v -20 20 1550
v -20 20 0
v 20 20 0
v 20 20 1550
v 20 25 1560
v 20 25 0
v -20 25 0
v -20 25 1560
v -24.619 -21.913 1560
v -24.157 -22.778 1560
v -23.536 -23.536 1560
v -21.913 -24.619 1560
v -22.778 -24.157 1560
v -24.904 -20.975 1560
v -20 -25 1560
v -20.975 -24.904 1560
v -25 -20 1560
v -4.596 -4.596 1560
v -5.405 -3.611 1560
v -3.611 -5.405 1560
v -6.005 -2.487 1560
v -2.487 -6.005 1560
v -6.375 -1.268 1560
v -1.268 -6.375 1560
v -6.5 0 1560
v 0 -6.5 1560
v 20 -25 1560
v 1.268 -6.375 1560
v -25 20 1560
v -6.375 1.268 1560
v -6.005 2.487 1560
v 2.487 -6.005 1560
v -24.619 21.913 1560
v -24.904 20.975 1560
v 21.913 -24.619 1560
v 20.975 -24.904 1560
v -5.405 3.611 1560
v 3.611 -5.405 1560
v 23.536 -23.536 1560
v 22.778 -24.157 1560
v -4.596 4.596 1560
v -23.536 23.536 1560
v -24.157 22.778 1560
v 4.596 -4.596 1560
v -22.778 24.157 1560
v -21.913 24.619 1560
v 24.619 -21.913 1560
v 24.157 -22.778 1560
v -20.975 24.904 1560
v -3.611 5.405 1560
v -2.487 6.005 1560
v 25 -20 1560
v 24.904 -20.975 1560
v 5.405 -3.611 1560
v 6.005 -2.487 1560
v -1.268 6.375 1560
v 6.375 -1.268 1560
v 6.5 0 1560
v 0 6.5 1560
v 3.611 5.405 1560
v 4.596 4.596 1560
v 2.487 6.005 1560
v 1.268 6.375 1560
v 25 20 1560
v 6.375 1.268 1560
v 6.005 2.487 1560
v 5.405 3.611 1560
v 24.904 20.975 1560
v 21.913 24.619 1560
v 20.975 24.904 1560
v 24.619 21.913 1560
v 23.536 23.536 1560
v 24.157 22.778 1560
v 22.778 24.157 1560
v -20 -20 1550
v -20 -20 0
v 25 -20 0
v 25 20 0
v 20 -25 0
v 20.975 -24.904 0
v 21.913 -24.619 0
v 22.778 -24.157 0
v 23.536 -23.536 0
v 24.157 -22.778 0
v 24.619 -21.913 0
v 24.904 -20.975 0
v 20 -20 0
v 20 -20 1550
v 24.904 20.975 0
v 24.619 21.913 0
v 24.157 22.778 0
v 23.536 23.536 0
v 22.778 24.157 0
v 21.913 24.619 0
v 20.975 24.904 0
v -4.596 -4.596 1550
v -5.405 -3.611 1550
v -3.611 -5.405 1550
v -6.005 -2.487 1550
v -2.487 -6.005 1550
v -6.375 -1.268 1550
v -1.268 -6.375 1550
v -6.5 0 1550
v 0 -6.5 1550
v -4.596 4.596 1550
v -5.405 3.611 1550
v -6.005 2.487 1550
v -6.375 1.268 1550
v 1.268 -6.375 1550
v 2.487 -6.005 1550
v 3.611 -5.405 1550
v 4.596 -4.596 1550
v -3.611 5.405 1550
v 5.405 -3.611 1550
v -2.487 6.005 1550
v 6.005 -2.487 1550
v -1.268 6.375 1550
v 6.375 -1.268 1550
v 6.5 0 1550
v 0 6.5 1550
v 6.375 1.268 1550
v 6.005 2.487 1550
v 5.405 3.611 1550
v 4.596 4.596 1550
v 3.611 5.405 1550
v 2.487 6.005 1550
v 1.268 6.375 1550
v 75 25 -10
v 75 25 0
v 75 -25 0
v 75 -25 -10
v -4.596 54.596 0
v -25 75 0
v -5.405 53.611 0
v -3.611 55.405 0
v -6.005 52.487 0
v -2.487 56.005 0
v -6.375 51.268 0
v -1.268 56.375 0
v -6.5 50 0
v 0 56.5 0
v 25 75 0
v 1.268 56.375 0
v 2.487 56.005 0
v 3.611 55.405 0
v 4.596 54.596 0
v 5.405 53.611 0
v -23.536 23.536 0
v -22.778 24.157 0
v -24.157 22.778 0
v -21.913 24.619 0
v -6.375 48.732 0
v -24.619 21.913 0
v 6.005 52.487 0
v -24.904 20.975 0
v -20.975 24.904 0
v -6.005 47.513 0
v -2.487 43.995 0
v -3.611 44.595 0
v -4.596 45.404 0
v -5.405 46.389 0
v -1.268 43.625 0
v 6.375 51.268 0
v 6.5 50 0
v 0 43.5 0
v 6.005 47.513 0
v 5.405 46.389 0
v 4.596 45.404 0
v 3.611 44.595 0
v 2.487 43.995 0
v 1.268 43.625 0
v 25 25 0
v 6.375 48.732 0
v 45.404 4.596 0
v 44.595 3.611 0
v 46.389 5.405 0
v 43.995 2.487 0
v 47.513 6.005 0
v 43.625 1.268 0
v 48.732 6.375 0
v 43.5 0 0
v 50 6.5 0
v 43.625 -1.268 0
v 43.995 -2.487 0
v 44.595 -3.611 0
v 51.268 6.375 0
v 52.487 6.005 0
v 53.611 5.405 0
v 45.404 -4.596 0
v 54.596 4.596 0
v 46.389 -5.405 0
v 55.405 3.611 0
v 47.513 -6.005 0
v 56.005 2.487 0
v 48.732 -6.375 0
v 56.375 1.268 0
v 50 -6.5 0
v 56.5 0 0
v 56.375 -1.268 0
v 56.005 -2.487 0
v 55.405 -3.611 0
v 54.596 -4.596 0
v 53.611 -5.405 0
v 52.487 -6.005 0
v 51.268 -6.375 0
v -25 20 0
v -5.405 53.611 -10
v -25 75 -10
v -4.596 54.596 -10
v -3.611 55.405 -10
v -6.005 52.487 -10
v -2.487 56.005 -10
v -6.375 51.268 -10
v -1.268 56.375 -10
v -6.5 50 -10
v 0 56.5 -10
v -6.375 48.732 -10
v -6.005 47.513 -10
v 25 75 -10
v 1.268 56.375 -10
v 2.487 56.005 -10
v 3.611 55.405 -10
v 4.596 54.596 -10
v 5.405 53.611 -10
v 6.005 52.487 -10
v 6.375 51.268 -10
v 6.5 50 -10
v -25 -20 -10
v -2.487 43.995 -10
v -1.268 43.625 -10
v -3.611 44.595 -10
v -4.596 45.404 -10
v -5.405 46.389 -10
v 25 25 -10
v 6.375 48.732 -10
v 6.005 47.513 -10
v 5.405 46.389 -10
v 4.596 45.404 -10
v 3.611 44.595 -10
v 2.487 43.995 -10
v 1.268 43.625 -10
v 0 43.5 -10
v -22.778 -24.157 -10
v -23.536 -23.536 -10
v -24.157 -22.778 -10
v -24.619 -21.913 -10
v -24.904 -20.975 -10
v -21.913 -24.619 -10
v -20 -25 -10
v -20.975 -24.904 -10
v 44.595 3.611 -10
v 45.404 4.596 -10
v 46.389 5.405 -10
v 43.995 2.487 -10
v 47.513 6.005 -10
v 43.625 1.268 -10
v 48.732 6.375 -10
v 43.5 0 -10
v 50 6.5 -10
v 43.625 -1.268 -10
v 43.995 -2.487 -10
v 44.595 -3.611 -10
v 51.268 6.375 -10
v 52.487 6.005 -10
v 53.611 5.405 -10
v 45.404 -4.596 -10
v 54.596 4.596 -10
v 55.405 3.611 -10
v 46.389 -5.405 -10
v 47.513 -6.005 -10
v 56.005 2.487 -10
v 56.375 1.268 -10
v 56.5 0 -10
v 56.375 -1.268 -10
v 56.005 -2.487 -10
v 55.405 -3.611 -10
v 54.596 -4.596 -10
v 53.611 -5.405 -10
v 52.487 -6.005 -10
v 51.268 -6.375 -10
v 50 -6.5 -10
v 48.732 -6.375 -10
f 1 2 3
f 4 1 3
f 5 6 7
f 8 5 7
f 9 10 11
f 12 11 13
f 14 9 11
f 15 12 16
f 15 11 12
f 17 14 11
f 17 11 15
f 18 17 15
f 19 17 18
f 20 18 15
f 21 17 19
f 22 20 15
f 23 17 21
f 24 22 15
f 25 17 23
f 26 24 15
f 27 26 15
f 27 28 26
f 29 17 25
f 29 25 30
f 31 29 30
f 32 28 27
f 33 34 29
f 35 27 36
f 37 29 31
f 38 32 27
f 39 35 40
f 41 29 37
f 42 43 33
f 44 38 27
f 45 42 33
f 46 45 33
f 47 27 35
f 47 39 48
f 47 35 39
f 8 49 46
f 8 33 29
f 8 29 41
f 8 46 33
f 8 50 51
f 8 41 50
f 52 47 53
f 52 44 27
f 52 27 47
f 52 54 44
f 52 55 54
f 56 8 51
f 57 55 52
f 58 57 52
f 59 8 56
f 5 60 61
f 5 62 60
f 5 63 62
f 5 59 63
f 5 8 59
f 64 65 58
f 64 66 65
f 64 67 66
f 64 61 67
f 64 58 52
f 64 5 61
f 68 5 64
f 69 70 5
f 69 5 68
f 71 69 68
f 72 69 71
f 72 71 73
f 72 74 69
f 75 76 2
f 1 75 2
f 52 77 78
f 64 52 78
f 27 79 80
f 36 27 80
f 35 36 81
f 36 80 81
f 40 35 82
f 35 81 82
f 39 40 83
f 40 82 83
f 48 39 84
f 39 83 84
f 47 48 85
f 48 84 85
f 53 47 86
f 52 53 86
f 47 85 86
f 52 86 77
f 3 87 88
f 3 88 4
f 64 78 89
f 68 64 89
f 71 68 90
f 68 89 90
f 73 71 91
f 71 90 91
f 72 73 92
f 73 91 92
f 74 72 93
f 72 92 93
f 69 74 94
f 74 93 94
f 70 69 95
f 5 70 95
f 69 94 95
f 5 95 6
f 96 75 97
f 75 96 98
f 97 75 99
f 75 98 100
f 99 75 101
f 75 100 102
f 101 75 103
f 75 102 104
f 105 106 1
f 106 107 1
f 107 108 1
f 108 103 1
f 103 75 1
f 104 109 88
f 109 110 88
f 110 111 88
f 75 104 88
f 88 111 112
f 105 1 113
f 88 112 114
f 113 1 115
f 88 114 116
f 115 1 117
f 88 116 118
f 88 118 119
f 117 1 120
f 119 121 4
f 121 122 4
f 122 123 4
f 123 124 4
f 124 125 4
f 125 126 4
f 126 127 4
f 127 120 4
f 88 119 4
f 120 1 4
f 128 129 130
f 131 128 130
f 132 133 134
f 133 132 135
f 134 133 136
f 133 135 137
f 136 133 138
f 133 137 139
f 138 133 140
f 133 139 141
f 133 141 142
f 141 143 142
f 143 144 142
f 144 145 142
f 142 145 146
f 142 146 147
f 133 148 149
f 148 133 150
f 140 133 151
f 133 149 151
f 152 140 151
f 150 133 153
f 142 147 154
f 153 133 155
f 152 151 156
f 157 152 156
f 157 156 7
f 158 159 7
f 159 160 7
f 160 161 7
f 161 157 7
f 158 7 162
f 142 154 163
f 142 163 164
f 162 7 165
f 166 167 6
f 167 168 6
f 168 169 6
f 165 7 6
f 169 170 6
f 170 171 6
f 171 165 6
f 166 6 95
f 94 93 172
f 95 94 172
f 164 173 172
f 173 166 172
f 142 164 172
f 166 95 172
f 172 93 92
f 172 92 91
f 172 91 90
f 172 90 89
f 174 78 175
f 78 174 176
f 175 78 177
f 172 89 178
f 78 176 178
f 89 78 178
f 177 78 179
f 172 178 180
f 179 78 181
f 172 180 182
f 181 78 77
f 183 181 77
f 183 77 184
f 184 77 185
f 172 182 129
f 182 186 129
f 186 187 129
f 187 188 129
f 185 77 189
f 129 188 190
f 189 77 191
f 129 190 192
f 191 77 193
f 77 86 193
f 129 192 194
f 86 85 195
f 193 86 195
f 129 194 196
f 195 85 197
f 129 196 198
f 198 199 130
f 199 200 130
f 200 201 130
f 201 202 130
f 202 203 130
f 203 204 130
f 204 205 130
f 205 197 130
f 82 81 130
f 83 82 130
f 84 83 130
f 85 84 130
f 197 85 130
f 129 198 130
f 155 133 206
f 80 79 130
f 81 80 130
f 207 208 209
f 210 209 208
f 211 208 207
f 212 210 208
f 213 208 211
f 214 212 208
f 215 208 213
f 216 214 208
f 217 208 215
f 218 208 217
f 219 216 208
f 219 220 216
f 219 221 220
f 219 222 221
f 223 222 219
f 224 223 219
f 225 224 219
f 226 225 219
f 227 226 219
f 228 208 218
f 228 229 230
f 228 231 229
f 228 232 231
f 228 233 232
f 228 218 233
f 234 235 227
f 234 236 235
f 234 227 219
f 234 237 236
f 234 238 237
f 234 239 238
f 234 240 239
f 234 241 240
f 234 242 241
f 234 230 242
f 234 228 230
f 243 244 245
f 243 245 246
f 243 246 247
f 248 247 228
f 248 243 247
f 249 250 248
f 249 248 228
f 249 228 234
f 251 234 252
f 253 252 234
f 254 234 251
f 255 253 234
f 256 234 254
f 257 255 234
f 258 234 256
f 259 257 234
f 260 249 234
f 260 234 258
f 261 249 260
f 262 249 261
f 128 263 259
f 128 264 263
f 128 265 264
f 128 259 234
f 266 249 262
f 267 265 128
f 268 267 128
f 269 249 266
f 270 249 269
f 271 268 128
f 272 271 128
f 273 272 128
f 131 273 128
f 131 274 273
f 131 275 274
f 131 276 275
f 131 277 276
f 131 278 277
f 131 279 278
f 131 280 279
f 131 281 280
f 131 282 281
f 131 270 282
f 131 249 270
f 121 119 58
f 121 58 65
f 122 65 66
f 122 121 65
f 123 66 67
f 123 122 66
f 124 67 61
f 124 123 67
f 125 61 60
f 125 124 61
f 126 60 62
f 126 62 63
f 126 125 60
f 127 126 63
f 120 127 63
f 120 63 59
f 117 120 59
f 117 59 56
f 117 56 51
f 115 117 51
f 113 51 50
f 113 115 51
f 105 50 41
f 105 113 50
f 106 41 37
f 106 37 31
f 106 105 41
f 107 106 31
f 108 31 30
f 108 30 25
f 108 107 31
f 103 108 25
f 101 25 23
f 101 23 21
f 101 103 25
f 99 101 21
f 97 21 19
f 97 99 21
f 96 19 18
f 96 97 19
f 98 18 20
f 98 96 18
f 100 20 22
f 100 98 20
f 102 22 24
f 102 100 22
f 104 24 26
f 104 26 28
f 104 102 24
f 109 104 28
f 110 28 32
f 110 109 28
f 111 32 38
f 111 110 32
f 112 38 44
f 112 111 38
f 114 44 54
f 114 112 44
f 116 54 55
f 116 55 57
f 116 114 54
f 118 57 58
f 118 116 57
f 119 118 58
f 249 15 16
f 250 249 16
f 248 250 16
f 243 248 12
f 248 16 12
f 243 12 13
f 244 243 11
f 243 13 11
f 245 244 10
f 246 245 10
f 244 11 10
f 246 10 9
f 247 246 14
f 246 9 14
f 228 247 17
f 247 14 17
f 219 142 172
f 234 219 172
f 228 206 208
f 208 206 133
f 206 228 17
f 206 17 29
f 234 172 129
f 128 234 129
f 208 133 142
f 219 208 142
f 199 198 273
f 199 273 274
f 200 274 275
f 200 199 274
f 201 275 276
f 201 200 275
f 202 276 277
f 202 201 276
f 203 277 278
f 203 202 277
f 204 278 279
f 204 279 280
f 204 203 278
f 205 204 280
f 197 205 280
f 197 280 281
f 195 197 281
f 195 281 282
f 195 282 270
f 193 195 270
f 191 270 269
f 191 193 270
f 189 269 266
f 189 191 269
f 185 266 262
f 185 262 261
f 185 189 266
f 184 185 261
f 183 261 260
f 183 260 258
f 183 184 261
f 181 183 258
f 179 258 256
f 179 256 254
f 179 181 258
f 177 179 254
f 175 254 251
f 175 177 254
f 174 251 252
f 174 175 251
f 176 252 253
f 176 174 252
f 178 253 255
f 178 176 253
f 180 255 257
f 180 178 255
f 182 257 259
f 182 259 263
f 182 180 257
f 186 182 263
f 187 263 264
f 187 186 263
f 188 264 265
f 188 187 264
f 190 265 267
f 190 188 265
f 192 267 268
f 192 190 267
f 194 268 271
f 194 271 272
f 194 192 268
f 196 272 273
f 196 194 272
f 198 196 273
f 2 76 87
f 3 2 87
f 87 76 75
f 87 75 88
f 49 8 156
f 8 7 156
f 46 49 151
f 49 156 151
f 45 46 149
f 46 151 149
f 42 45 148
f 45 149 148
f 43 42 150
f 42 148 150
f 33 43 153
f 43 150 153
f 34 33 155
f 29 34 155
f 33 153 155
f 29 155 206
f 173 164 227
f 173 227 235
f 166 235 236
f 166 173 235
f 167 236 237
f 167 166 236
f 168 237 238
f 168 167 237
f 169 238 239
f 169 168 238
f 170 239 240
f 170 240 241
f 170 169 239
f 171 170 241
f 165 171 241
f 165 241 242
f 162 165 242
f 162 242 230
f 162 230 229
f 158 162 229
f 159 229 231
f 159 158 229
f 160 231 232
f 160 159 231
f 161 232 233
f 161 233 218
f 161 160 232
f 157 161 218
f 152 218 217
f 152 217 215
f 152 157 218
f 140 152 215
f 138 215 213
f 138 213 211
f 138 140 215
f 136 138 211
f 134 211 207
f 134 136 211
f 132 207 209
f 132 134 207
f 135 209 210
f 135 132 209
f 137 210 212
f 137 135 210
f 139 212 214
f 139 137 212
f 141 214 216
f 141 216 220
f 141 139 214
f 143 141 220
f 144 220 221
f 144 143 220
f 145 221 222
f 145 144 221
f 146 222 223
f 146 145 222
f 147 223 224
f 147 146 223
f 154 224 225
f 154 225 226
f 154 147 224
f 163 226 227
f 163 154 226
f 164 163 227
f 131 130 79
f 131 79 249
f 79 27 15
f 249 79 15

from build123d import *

# Parameters (mm, degrees)
F0_W     = 40
F0_H     = 40
F1_DEPTH = 1550
F2_R     = 6.5
F3_DEPTH = 10
F4_R     = 6.5
F5_DEPTH = 10


with BuildPart() as f1:
    # F0 (on Top) → F1 (new body)
    with BuildSketch(Plane.XY):
        with BuildLine():
            Line((-20, -25), (20, -25))
            ThreePointArc((20, -25), (23.535534, -23.535534), (25, -20))
            Line((25, -20), (25, 20))
            ThreePointArc((25, 20), (23.535534, 23.535534), (20, 25))
            Line((20, 25), (-20, 25))
            ThreePointArc((-20, 25), (-23.535534, 23.535534), (-25, 20))
            Line((-25, 20), (-25, -20))
            ThreePointArc((-25, -20), (-23.535534, -23.535534), (-20, -25))
        make_face()
        Rectangle(F0_W, F0_H, mode=Mode.SUBTRACT)
    extrude(amount=F1_DEPTH)

    # F2 (on face) → F3 (join)
    with BuildSketch(Plane.XY.offset(1550)):
        with BuildLine():
            Line((20, 25), (-20, 25))
            ThreePointArc((-20, 25), (-23.535534, 23.535534), (-25, 20))
            Line((-25, 20), (-25, -20))
            ThreePointArc((-25, -20), (-23.535534, -23.535534), (-20, -25))
            Line((-20, -25), (20, -25))
            ThreePointArc((20, -25), (23.535534, -23.535534), (25, -20))
            Line((25, -20), (25, 20))
            ThreePointArc((25, 20), (23.535534, 23.535534), (20, 25))
        make_face()
        Circle(F2_R, mode=Mode.SUBTRACT)
    extrude(amount=F3_DEPTH)

    # F4 (on face) → F5 (join)
    with BuildSketch(Plane(origin=(0, 0, 0), x_dir=(1, 0, 0), z_dir=(0, 0, -1))):
        with BuildLine():
            ThreePointArc((-20, 25), (-23.535534, 23.535534), (-25, 20))
            Line((-25, 20), (-25, -75))
            Line((-25, -75), (25, -75))
            Line((25, -75), (25, -25))
            Line((25, -25), (75, -25))
            Line((75, -25), (75, 25))
            Line((75, 25), (-20, 25))
        make_face()
        with Locations((0, -50)):
            Circle(F4_R, mode=Mode.SUBTRACT)
        with Locations((50, 0)):
            Circle(F4_R, mode=Mode.SUBTRACT)
    extrude(amount=F5_DEPTH)


solid = f1.part
